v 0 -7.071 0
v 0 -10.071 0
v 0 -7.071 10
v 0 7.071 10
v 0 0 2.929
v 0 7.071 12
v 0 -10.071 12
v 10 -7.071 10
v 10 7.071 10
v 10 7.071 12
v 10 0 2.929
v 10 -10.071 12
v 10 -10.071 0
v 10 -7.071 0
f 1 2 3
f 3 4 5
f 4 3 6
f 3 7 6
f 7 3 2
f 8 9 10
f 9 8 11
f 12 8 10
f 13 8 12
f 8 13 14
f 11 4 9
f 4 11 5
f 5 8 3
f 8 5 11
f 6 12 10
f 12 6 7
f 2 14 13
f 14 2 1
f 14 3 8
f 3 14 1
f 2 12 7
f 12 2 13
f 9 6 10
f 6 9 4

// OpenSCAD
translate([0, 0, 10 - 10*sqrt(2)/2])
difference() {
rotate([45, 0, 0])
cube(size=[10, 10, 10]);
translate([-1, -10, 10 * sqrt(2)/2 + 1])
cube(size=[12, 20, 10]);
}

translate([0, -10 * sqrt(2)/2 - 3, 0])
cube(size=[10, 3, 12]);
translate([0, -10*sqrt(2)/2 -1, 10])
cube(size=[10, 10*sqrt(2) + 1, 2]);
